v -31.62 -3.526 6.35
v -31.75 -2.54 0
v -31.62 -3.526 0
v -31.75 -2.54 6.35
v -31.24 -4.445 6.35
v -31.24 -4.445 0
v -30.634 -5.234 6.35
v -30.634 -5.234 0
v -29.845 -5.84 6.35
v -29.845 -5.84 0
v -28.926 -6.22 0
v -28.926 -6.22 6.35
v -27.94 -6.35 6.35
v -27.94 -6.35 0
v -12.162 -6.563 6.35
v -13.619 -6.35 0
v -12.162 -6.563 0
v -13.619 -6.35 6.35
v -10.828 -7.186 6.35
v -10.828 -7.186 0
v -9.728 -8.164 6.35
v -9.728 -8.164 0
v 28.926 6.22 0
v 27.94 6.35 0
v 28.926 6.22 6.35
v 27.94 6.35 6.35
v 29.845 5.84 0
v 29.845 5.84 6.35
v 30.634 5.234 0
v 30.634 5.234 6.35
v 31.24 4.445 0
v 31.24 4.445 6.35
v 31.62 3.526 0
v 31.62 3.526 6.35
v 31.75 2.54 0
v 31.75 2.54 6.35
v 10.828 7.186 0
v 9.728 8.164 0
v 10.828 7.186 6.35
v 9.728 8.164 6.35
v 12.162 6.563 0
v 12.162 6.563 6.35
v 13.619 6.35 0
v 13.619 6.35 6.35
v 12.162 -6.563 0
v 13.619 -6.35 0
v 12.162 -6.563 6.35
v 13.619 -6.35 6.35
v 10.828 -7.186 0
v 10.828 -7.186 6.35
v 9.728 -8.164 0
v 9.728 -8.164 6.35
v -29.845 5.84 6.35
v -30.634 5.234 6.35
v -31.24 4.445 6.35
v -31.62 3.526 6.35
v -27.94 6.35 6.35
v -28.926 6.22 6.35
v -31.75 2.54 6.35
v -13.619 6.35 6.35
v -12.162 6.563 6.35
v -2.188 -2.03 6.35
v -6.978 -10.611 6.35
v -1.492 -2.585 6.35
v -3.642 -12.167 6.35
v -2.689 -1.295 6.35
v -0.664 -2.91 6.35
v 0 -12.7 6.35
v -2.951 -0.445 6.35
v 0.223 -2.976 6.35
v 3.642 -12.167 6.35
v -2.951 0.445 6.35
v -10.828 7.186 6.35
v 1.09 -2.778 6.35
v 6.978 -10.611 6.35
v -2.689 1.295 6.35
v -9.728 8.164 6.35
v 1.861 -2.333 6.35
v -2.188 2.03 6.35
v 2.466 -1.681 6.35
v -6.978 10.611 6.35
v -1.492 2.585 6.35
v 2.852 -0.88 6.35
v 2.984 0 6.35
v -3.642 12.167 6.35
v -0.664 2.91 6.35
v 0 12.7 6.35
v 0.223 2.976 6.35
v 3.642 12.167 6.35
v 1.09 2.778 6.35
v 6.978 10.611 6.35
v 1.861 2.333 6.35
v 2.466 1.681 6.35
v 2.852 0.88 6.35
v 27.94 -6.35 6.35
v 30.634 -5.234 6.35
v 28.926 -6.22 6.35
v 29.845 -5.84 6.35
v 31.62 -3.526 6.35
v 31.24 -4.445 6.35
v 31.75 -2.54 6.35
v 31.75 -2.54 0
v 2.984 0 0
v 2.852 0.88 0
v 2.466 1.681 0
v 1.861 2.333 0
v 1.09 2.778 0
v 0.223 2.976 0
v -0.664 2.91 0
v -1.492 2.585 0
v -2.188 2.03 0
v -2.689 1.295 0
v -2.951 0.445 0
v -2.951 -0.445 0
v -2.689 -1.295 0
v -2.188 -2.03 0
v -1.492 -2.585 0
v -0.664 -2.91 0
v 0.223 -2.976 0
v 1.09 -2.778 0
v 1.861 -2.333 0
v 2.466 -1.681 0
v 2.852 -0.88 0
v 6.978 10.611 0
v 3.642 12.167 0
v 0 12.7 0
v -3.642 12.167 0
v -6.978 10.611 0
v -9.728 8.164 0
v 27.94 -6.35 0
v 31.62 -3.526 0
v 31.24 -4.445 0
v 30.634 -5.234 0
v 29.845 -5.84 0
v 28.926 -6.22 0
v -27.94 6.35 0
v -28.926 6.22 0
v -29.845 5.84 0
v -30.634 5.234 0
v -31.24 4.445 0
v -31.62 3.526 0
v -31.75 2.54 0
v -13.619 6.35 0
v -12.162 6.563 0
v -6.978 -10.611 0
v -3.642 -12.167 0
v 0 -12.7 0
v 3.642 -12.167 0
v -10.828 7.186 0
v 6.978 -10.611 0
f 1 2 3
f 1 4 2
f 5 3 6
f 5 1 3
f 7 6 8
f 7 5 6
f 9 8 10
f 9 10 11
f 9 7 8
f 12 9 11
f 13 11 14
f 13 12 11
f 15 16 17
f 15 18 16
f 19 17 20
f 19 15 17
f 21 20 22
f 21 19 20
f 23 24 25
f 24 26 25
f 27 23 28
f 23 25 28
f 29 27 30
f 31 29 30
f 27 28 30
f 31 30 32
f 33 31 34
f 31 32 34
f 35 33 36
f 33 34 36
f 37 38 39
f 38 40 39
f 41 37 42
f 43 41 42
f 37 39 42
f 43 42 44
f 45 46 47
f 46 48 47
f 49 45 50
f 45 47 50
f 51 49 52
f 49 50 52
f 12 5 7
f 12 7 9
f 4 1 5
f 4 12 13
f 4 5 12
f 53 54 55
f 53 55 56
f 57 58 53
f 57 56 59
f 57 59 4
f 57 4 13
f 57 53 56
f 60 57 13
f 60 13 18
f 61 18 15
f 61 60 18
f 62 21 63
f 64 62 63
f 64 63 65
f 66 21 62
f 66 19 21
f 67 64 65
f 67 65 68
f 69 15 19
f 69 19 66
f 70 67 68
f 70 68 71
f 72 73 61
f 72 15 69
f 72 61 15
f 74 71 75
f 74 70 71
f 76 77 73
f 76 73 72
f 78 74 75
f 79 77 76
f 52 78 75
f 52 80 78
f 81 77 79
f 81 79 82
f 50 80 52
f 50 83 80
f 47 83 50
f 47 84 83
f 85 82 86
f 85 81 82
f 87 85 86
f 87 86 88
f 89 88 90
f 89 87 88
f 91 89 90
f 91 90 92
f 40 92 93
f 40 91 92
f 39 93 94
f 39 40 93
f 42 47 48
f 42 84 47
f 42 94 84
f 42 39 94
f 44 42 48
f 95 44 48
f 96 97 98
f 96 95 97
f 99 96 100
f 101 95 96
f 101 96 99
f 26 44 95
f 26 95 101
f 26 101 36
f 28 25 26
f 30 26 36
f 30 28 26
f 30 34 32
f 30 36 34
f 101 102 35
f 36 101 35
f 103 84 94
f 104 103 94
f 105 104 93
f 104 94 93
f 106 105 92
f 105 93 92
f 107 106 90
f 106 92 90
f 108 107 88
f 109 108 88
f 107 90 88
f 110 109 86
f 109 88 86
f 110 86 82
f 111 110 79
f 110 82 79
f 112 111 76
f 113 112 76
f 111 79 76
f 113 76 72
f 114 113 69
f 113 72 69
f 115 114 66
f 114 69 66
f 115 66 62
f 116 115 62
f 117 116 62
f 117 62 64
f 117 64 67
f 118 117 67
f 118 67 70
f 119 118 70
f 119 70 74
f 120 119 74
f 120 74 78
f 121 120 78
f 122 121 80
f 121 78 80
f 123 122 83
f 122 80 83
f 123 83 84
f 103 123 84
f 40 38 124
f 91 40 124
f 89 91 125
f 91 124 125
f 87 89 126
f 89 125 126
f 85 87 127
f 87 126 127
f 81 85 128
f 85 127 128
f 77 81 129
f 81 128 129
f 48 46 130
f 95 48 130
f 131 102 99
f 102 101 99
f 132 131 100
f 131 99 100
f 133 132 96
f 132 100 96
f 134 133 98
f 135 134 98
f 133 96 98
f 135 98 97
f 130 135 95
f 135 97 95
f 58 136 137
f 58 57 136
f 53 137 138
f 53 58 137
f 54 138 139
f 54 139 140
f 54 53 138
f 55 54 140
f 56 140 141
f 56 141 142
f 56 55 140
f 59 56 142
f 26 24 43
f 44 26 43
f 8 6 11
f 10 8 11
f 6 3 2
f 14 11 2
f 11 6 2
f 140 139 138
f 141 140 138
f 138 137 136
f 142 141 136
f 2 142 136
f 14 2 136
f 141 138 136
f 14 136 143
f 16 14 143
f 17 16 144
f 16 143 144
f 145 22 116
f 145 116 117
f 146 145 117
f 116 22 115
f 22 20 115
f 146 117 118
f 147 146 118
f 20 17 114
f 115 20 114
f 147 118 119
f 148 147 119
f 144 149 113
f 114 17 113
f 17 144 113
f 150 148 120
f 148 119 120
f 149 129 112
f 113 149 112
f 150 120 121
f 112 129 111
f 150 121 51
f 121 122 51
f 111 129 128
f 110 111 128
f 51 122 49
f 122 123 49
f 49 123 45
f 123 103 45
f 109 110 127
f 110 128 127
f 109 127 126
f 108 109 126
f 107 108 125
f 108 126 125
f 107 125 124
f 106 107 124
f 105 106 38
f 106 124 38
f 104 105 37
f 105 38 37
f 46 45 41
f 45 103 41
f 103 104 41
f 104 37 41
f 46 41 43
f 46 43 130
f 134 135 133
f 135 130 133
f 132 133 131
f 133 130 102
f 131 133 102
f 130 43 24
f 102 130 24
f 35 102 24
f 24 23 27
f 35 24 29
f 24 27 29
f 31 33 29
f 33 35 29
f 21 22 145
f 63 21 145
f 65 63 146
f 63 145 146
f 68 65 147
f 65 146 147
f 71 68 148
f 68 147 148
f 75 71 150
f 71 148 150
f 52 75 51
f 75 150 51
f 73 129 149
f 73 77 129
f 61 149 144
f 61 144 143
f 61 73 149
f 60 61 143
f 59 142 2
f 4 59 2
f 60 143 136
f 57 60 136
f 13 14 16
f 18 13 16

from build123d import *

# Parameters (mm, degrees)
F1_DEPTH = 6.35
F2_R     = 2.9845
F3_DEPTH = 6.35
F4_R     = 5.08
F5_R     = 3.81


with BuildPart() as f1:
    # F0 (on Top) → F1 (new body)
    with BuildSketch(Plane.XY):
        with BuildLine():
            Line((-10.9985226281, 6.35), (10.9985226281, 6.35))
            ThreePointArc((10.9985226281, 6.35), (0, 12.7), (-10.9985226281, 6.35))
        make_face()
        with BuildLine():
            ThreePointArc((-10.9985226281, -6.35), (-12.7, 0), (-10.9985226281, 6.35))
            Line((-10.9985226281, 6.35), (-31.75, 6.35))
            Line((-31.75, 6.35), (-31.75, -6.35))
            Line((-31.75, -6.35), (-10.9985226281, -6.35))
        make_face()
        with BuildLine():
            ThreePointArc((10.9985226281, -6.35), (12.2672579939, -3.2870018728), (12.7, 0))
            ThreePointArc((12.7, 0), (12.2672579939, 3.2870018728), (10.9985226281, 6.35))
            Line((10.9985226281, 6.35), (-10.9985226281, 6.35))
            ThreePointArc((-10.9985226281, 6.35), (-12.7, 0), (-10.9985226281, -6.35))
            Line((-10.9985226281, -6.35), (10.9985226281, -6.35))
        make_face()
        with BuildLine():
            ThreePointArc((10.9985226281, 6.35), (12.2672579939, 3.2870018728), (12.7, 0))
            ThreePointArc((12.7, 0), (12.2672579939, -3.2870018728), (10.9985226281, -6.35))
            Line((10.9985226281, -6.35), (31.75, -6.35))
            Line((31.75, -6.35), (31.75, 6.35))
            Line((31.75, 6.35), (10.9985226281, 6.35))
        make_face()
        with BuildLine():
            ThreePointArc((-10.9985226281, -6.35), (0, -12.7), (10.9985226281, -6.35))
            Line((10.9985226281, -6.35), (-10.9985226281, -6.35))
        make_face()
    extrude(amount=F1_DEPTH)

    # F2 (on face) → F3 (cut)
    with BuildSketch(Plane.XY.offset(6.35)):
        Circle(F2_R)
    extrude(amount=-F3_DEPTH, mode=Mode.SUBTRACT)

    # F4
    f4_edges = [f1.edges().sort_by_distance(p)[0] for p in [
        (-10.998523, 6.35, 3.175),
        (10.998523, -6.35, 3.175),
        (-10.998523, -6.35, 3.175),
        (10.998523, 6.35, 3.175),
    ]]
    fillet(f4_edges, radius=F4_R)

    # F5
    f5_edges = [f1.edges().sort_by_distance(p)[0] for p in [
        (-31.75, 6.35, 3.175),
        (-31.75, -6.35, 3.175),
        (31.75, -6.35, 3.175),
        (31.75, 6.35, 3.175),
    ]]
    fillet(f5_edges, radius=F5_R)


solid = f1.part
